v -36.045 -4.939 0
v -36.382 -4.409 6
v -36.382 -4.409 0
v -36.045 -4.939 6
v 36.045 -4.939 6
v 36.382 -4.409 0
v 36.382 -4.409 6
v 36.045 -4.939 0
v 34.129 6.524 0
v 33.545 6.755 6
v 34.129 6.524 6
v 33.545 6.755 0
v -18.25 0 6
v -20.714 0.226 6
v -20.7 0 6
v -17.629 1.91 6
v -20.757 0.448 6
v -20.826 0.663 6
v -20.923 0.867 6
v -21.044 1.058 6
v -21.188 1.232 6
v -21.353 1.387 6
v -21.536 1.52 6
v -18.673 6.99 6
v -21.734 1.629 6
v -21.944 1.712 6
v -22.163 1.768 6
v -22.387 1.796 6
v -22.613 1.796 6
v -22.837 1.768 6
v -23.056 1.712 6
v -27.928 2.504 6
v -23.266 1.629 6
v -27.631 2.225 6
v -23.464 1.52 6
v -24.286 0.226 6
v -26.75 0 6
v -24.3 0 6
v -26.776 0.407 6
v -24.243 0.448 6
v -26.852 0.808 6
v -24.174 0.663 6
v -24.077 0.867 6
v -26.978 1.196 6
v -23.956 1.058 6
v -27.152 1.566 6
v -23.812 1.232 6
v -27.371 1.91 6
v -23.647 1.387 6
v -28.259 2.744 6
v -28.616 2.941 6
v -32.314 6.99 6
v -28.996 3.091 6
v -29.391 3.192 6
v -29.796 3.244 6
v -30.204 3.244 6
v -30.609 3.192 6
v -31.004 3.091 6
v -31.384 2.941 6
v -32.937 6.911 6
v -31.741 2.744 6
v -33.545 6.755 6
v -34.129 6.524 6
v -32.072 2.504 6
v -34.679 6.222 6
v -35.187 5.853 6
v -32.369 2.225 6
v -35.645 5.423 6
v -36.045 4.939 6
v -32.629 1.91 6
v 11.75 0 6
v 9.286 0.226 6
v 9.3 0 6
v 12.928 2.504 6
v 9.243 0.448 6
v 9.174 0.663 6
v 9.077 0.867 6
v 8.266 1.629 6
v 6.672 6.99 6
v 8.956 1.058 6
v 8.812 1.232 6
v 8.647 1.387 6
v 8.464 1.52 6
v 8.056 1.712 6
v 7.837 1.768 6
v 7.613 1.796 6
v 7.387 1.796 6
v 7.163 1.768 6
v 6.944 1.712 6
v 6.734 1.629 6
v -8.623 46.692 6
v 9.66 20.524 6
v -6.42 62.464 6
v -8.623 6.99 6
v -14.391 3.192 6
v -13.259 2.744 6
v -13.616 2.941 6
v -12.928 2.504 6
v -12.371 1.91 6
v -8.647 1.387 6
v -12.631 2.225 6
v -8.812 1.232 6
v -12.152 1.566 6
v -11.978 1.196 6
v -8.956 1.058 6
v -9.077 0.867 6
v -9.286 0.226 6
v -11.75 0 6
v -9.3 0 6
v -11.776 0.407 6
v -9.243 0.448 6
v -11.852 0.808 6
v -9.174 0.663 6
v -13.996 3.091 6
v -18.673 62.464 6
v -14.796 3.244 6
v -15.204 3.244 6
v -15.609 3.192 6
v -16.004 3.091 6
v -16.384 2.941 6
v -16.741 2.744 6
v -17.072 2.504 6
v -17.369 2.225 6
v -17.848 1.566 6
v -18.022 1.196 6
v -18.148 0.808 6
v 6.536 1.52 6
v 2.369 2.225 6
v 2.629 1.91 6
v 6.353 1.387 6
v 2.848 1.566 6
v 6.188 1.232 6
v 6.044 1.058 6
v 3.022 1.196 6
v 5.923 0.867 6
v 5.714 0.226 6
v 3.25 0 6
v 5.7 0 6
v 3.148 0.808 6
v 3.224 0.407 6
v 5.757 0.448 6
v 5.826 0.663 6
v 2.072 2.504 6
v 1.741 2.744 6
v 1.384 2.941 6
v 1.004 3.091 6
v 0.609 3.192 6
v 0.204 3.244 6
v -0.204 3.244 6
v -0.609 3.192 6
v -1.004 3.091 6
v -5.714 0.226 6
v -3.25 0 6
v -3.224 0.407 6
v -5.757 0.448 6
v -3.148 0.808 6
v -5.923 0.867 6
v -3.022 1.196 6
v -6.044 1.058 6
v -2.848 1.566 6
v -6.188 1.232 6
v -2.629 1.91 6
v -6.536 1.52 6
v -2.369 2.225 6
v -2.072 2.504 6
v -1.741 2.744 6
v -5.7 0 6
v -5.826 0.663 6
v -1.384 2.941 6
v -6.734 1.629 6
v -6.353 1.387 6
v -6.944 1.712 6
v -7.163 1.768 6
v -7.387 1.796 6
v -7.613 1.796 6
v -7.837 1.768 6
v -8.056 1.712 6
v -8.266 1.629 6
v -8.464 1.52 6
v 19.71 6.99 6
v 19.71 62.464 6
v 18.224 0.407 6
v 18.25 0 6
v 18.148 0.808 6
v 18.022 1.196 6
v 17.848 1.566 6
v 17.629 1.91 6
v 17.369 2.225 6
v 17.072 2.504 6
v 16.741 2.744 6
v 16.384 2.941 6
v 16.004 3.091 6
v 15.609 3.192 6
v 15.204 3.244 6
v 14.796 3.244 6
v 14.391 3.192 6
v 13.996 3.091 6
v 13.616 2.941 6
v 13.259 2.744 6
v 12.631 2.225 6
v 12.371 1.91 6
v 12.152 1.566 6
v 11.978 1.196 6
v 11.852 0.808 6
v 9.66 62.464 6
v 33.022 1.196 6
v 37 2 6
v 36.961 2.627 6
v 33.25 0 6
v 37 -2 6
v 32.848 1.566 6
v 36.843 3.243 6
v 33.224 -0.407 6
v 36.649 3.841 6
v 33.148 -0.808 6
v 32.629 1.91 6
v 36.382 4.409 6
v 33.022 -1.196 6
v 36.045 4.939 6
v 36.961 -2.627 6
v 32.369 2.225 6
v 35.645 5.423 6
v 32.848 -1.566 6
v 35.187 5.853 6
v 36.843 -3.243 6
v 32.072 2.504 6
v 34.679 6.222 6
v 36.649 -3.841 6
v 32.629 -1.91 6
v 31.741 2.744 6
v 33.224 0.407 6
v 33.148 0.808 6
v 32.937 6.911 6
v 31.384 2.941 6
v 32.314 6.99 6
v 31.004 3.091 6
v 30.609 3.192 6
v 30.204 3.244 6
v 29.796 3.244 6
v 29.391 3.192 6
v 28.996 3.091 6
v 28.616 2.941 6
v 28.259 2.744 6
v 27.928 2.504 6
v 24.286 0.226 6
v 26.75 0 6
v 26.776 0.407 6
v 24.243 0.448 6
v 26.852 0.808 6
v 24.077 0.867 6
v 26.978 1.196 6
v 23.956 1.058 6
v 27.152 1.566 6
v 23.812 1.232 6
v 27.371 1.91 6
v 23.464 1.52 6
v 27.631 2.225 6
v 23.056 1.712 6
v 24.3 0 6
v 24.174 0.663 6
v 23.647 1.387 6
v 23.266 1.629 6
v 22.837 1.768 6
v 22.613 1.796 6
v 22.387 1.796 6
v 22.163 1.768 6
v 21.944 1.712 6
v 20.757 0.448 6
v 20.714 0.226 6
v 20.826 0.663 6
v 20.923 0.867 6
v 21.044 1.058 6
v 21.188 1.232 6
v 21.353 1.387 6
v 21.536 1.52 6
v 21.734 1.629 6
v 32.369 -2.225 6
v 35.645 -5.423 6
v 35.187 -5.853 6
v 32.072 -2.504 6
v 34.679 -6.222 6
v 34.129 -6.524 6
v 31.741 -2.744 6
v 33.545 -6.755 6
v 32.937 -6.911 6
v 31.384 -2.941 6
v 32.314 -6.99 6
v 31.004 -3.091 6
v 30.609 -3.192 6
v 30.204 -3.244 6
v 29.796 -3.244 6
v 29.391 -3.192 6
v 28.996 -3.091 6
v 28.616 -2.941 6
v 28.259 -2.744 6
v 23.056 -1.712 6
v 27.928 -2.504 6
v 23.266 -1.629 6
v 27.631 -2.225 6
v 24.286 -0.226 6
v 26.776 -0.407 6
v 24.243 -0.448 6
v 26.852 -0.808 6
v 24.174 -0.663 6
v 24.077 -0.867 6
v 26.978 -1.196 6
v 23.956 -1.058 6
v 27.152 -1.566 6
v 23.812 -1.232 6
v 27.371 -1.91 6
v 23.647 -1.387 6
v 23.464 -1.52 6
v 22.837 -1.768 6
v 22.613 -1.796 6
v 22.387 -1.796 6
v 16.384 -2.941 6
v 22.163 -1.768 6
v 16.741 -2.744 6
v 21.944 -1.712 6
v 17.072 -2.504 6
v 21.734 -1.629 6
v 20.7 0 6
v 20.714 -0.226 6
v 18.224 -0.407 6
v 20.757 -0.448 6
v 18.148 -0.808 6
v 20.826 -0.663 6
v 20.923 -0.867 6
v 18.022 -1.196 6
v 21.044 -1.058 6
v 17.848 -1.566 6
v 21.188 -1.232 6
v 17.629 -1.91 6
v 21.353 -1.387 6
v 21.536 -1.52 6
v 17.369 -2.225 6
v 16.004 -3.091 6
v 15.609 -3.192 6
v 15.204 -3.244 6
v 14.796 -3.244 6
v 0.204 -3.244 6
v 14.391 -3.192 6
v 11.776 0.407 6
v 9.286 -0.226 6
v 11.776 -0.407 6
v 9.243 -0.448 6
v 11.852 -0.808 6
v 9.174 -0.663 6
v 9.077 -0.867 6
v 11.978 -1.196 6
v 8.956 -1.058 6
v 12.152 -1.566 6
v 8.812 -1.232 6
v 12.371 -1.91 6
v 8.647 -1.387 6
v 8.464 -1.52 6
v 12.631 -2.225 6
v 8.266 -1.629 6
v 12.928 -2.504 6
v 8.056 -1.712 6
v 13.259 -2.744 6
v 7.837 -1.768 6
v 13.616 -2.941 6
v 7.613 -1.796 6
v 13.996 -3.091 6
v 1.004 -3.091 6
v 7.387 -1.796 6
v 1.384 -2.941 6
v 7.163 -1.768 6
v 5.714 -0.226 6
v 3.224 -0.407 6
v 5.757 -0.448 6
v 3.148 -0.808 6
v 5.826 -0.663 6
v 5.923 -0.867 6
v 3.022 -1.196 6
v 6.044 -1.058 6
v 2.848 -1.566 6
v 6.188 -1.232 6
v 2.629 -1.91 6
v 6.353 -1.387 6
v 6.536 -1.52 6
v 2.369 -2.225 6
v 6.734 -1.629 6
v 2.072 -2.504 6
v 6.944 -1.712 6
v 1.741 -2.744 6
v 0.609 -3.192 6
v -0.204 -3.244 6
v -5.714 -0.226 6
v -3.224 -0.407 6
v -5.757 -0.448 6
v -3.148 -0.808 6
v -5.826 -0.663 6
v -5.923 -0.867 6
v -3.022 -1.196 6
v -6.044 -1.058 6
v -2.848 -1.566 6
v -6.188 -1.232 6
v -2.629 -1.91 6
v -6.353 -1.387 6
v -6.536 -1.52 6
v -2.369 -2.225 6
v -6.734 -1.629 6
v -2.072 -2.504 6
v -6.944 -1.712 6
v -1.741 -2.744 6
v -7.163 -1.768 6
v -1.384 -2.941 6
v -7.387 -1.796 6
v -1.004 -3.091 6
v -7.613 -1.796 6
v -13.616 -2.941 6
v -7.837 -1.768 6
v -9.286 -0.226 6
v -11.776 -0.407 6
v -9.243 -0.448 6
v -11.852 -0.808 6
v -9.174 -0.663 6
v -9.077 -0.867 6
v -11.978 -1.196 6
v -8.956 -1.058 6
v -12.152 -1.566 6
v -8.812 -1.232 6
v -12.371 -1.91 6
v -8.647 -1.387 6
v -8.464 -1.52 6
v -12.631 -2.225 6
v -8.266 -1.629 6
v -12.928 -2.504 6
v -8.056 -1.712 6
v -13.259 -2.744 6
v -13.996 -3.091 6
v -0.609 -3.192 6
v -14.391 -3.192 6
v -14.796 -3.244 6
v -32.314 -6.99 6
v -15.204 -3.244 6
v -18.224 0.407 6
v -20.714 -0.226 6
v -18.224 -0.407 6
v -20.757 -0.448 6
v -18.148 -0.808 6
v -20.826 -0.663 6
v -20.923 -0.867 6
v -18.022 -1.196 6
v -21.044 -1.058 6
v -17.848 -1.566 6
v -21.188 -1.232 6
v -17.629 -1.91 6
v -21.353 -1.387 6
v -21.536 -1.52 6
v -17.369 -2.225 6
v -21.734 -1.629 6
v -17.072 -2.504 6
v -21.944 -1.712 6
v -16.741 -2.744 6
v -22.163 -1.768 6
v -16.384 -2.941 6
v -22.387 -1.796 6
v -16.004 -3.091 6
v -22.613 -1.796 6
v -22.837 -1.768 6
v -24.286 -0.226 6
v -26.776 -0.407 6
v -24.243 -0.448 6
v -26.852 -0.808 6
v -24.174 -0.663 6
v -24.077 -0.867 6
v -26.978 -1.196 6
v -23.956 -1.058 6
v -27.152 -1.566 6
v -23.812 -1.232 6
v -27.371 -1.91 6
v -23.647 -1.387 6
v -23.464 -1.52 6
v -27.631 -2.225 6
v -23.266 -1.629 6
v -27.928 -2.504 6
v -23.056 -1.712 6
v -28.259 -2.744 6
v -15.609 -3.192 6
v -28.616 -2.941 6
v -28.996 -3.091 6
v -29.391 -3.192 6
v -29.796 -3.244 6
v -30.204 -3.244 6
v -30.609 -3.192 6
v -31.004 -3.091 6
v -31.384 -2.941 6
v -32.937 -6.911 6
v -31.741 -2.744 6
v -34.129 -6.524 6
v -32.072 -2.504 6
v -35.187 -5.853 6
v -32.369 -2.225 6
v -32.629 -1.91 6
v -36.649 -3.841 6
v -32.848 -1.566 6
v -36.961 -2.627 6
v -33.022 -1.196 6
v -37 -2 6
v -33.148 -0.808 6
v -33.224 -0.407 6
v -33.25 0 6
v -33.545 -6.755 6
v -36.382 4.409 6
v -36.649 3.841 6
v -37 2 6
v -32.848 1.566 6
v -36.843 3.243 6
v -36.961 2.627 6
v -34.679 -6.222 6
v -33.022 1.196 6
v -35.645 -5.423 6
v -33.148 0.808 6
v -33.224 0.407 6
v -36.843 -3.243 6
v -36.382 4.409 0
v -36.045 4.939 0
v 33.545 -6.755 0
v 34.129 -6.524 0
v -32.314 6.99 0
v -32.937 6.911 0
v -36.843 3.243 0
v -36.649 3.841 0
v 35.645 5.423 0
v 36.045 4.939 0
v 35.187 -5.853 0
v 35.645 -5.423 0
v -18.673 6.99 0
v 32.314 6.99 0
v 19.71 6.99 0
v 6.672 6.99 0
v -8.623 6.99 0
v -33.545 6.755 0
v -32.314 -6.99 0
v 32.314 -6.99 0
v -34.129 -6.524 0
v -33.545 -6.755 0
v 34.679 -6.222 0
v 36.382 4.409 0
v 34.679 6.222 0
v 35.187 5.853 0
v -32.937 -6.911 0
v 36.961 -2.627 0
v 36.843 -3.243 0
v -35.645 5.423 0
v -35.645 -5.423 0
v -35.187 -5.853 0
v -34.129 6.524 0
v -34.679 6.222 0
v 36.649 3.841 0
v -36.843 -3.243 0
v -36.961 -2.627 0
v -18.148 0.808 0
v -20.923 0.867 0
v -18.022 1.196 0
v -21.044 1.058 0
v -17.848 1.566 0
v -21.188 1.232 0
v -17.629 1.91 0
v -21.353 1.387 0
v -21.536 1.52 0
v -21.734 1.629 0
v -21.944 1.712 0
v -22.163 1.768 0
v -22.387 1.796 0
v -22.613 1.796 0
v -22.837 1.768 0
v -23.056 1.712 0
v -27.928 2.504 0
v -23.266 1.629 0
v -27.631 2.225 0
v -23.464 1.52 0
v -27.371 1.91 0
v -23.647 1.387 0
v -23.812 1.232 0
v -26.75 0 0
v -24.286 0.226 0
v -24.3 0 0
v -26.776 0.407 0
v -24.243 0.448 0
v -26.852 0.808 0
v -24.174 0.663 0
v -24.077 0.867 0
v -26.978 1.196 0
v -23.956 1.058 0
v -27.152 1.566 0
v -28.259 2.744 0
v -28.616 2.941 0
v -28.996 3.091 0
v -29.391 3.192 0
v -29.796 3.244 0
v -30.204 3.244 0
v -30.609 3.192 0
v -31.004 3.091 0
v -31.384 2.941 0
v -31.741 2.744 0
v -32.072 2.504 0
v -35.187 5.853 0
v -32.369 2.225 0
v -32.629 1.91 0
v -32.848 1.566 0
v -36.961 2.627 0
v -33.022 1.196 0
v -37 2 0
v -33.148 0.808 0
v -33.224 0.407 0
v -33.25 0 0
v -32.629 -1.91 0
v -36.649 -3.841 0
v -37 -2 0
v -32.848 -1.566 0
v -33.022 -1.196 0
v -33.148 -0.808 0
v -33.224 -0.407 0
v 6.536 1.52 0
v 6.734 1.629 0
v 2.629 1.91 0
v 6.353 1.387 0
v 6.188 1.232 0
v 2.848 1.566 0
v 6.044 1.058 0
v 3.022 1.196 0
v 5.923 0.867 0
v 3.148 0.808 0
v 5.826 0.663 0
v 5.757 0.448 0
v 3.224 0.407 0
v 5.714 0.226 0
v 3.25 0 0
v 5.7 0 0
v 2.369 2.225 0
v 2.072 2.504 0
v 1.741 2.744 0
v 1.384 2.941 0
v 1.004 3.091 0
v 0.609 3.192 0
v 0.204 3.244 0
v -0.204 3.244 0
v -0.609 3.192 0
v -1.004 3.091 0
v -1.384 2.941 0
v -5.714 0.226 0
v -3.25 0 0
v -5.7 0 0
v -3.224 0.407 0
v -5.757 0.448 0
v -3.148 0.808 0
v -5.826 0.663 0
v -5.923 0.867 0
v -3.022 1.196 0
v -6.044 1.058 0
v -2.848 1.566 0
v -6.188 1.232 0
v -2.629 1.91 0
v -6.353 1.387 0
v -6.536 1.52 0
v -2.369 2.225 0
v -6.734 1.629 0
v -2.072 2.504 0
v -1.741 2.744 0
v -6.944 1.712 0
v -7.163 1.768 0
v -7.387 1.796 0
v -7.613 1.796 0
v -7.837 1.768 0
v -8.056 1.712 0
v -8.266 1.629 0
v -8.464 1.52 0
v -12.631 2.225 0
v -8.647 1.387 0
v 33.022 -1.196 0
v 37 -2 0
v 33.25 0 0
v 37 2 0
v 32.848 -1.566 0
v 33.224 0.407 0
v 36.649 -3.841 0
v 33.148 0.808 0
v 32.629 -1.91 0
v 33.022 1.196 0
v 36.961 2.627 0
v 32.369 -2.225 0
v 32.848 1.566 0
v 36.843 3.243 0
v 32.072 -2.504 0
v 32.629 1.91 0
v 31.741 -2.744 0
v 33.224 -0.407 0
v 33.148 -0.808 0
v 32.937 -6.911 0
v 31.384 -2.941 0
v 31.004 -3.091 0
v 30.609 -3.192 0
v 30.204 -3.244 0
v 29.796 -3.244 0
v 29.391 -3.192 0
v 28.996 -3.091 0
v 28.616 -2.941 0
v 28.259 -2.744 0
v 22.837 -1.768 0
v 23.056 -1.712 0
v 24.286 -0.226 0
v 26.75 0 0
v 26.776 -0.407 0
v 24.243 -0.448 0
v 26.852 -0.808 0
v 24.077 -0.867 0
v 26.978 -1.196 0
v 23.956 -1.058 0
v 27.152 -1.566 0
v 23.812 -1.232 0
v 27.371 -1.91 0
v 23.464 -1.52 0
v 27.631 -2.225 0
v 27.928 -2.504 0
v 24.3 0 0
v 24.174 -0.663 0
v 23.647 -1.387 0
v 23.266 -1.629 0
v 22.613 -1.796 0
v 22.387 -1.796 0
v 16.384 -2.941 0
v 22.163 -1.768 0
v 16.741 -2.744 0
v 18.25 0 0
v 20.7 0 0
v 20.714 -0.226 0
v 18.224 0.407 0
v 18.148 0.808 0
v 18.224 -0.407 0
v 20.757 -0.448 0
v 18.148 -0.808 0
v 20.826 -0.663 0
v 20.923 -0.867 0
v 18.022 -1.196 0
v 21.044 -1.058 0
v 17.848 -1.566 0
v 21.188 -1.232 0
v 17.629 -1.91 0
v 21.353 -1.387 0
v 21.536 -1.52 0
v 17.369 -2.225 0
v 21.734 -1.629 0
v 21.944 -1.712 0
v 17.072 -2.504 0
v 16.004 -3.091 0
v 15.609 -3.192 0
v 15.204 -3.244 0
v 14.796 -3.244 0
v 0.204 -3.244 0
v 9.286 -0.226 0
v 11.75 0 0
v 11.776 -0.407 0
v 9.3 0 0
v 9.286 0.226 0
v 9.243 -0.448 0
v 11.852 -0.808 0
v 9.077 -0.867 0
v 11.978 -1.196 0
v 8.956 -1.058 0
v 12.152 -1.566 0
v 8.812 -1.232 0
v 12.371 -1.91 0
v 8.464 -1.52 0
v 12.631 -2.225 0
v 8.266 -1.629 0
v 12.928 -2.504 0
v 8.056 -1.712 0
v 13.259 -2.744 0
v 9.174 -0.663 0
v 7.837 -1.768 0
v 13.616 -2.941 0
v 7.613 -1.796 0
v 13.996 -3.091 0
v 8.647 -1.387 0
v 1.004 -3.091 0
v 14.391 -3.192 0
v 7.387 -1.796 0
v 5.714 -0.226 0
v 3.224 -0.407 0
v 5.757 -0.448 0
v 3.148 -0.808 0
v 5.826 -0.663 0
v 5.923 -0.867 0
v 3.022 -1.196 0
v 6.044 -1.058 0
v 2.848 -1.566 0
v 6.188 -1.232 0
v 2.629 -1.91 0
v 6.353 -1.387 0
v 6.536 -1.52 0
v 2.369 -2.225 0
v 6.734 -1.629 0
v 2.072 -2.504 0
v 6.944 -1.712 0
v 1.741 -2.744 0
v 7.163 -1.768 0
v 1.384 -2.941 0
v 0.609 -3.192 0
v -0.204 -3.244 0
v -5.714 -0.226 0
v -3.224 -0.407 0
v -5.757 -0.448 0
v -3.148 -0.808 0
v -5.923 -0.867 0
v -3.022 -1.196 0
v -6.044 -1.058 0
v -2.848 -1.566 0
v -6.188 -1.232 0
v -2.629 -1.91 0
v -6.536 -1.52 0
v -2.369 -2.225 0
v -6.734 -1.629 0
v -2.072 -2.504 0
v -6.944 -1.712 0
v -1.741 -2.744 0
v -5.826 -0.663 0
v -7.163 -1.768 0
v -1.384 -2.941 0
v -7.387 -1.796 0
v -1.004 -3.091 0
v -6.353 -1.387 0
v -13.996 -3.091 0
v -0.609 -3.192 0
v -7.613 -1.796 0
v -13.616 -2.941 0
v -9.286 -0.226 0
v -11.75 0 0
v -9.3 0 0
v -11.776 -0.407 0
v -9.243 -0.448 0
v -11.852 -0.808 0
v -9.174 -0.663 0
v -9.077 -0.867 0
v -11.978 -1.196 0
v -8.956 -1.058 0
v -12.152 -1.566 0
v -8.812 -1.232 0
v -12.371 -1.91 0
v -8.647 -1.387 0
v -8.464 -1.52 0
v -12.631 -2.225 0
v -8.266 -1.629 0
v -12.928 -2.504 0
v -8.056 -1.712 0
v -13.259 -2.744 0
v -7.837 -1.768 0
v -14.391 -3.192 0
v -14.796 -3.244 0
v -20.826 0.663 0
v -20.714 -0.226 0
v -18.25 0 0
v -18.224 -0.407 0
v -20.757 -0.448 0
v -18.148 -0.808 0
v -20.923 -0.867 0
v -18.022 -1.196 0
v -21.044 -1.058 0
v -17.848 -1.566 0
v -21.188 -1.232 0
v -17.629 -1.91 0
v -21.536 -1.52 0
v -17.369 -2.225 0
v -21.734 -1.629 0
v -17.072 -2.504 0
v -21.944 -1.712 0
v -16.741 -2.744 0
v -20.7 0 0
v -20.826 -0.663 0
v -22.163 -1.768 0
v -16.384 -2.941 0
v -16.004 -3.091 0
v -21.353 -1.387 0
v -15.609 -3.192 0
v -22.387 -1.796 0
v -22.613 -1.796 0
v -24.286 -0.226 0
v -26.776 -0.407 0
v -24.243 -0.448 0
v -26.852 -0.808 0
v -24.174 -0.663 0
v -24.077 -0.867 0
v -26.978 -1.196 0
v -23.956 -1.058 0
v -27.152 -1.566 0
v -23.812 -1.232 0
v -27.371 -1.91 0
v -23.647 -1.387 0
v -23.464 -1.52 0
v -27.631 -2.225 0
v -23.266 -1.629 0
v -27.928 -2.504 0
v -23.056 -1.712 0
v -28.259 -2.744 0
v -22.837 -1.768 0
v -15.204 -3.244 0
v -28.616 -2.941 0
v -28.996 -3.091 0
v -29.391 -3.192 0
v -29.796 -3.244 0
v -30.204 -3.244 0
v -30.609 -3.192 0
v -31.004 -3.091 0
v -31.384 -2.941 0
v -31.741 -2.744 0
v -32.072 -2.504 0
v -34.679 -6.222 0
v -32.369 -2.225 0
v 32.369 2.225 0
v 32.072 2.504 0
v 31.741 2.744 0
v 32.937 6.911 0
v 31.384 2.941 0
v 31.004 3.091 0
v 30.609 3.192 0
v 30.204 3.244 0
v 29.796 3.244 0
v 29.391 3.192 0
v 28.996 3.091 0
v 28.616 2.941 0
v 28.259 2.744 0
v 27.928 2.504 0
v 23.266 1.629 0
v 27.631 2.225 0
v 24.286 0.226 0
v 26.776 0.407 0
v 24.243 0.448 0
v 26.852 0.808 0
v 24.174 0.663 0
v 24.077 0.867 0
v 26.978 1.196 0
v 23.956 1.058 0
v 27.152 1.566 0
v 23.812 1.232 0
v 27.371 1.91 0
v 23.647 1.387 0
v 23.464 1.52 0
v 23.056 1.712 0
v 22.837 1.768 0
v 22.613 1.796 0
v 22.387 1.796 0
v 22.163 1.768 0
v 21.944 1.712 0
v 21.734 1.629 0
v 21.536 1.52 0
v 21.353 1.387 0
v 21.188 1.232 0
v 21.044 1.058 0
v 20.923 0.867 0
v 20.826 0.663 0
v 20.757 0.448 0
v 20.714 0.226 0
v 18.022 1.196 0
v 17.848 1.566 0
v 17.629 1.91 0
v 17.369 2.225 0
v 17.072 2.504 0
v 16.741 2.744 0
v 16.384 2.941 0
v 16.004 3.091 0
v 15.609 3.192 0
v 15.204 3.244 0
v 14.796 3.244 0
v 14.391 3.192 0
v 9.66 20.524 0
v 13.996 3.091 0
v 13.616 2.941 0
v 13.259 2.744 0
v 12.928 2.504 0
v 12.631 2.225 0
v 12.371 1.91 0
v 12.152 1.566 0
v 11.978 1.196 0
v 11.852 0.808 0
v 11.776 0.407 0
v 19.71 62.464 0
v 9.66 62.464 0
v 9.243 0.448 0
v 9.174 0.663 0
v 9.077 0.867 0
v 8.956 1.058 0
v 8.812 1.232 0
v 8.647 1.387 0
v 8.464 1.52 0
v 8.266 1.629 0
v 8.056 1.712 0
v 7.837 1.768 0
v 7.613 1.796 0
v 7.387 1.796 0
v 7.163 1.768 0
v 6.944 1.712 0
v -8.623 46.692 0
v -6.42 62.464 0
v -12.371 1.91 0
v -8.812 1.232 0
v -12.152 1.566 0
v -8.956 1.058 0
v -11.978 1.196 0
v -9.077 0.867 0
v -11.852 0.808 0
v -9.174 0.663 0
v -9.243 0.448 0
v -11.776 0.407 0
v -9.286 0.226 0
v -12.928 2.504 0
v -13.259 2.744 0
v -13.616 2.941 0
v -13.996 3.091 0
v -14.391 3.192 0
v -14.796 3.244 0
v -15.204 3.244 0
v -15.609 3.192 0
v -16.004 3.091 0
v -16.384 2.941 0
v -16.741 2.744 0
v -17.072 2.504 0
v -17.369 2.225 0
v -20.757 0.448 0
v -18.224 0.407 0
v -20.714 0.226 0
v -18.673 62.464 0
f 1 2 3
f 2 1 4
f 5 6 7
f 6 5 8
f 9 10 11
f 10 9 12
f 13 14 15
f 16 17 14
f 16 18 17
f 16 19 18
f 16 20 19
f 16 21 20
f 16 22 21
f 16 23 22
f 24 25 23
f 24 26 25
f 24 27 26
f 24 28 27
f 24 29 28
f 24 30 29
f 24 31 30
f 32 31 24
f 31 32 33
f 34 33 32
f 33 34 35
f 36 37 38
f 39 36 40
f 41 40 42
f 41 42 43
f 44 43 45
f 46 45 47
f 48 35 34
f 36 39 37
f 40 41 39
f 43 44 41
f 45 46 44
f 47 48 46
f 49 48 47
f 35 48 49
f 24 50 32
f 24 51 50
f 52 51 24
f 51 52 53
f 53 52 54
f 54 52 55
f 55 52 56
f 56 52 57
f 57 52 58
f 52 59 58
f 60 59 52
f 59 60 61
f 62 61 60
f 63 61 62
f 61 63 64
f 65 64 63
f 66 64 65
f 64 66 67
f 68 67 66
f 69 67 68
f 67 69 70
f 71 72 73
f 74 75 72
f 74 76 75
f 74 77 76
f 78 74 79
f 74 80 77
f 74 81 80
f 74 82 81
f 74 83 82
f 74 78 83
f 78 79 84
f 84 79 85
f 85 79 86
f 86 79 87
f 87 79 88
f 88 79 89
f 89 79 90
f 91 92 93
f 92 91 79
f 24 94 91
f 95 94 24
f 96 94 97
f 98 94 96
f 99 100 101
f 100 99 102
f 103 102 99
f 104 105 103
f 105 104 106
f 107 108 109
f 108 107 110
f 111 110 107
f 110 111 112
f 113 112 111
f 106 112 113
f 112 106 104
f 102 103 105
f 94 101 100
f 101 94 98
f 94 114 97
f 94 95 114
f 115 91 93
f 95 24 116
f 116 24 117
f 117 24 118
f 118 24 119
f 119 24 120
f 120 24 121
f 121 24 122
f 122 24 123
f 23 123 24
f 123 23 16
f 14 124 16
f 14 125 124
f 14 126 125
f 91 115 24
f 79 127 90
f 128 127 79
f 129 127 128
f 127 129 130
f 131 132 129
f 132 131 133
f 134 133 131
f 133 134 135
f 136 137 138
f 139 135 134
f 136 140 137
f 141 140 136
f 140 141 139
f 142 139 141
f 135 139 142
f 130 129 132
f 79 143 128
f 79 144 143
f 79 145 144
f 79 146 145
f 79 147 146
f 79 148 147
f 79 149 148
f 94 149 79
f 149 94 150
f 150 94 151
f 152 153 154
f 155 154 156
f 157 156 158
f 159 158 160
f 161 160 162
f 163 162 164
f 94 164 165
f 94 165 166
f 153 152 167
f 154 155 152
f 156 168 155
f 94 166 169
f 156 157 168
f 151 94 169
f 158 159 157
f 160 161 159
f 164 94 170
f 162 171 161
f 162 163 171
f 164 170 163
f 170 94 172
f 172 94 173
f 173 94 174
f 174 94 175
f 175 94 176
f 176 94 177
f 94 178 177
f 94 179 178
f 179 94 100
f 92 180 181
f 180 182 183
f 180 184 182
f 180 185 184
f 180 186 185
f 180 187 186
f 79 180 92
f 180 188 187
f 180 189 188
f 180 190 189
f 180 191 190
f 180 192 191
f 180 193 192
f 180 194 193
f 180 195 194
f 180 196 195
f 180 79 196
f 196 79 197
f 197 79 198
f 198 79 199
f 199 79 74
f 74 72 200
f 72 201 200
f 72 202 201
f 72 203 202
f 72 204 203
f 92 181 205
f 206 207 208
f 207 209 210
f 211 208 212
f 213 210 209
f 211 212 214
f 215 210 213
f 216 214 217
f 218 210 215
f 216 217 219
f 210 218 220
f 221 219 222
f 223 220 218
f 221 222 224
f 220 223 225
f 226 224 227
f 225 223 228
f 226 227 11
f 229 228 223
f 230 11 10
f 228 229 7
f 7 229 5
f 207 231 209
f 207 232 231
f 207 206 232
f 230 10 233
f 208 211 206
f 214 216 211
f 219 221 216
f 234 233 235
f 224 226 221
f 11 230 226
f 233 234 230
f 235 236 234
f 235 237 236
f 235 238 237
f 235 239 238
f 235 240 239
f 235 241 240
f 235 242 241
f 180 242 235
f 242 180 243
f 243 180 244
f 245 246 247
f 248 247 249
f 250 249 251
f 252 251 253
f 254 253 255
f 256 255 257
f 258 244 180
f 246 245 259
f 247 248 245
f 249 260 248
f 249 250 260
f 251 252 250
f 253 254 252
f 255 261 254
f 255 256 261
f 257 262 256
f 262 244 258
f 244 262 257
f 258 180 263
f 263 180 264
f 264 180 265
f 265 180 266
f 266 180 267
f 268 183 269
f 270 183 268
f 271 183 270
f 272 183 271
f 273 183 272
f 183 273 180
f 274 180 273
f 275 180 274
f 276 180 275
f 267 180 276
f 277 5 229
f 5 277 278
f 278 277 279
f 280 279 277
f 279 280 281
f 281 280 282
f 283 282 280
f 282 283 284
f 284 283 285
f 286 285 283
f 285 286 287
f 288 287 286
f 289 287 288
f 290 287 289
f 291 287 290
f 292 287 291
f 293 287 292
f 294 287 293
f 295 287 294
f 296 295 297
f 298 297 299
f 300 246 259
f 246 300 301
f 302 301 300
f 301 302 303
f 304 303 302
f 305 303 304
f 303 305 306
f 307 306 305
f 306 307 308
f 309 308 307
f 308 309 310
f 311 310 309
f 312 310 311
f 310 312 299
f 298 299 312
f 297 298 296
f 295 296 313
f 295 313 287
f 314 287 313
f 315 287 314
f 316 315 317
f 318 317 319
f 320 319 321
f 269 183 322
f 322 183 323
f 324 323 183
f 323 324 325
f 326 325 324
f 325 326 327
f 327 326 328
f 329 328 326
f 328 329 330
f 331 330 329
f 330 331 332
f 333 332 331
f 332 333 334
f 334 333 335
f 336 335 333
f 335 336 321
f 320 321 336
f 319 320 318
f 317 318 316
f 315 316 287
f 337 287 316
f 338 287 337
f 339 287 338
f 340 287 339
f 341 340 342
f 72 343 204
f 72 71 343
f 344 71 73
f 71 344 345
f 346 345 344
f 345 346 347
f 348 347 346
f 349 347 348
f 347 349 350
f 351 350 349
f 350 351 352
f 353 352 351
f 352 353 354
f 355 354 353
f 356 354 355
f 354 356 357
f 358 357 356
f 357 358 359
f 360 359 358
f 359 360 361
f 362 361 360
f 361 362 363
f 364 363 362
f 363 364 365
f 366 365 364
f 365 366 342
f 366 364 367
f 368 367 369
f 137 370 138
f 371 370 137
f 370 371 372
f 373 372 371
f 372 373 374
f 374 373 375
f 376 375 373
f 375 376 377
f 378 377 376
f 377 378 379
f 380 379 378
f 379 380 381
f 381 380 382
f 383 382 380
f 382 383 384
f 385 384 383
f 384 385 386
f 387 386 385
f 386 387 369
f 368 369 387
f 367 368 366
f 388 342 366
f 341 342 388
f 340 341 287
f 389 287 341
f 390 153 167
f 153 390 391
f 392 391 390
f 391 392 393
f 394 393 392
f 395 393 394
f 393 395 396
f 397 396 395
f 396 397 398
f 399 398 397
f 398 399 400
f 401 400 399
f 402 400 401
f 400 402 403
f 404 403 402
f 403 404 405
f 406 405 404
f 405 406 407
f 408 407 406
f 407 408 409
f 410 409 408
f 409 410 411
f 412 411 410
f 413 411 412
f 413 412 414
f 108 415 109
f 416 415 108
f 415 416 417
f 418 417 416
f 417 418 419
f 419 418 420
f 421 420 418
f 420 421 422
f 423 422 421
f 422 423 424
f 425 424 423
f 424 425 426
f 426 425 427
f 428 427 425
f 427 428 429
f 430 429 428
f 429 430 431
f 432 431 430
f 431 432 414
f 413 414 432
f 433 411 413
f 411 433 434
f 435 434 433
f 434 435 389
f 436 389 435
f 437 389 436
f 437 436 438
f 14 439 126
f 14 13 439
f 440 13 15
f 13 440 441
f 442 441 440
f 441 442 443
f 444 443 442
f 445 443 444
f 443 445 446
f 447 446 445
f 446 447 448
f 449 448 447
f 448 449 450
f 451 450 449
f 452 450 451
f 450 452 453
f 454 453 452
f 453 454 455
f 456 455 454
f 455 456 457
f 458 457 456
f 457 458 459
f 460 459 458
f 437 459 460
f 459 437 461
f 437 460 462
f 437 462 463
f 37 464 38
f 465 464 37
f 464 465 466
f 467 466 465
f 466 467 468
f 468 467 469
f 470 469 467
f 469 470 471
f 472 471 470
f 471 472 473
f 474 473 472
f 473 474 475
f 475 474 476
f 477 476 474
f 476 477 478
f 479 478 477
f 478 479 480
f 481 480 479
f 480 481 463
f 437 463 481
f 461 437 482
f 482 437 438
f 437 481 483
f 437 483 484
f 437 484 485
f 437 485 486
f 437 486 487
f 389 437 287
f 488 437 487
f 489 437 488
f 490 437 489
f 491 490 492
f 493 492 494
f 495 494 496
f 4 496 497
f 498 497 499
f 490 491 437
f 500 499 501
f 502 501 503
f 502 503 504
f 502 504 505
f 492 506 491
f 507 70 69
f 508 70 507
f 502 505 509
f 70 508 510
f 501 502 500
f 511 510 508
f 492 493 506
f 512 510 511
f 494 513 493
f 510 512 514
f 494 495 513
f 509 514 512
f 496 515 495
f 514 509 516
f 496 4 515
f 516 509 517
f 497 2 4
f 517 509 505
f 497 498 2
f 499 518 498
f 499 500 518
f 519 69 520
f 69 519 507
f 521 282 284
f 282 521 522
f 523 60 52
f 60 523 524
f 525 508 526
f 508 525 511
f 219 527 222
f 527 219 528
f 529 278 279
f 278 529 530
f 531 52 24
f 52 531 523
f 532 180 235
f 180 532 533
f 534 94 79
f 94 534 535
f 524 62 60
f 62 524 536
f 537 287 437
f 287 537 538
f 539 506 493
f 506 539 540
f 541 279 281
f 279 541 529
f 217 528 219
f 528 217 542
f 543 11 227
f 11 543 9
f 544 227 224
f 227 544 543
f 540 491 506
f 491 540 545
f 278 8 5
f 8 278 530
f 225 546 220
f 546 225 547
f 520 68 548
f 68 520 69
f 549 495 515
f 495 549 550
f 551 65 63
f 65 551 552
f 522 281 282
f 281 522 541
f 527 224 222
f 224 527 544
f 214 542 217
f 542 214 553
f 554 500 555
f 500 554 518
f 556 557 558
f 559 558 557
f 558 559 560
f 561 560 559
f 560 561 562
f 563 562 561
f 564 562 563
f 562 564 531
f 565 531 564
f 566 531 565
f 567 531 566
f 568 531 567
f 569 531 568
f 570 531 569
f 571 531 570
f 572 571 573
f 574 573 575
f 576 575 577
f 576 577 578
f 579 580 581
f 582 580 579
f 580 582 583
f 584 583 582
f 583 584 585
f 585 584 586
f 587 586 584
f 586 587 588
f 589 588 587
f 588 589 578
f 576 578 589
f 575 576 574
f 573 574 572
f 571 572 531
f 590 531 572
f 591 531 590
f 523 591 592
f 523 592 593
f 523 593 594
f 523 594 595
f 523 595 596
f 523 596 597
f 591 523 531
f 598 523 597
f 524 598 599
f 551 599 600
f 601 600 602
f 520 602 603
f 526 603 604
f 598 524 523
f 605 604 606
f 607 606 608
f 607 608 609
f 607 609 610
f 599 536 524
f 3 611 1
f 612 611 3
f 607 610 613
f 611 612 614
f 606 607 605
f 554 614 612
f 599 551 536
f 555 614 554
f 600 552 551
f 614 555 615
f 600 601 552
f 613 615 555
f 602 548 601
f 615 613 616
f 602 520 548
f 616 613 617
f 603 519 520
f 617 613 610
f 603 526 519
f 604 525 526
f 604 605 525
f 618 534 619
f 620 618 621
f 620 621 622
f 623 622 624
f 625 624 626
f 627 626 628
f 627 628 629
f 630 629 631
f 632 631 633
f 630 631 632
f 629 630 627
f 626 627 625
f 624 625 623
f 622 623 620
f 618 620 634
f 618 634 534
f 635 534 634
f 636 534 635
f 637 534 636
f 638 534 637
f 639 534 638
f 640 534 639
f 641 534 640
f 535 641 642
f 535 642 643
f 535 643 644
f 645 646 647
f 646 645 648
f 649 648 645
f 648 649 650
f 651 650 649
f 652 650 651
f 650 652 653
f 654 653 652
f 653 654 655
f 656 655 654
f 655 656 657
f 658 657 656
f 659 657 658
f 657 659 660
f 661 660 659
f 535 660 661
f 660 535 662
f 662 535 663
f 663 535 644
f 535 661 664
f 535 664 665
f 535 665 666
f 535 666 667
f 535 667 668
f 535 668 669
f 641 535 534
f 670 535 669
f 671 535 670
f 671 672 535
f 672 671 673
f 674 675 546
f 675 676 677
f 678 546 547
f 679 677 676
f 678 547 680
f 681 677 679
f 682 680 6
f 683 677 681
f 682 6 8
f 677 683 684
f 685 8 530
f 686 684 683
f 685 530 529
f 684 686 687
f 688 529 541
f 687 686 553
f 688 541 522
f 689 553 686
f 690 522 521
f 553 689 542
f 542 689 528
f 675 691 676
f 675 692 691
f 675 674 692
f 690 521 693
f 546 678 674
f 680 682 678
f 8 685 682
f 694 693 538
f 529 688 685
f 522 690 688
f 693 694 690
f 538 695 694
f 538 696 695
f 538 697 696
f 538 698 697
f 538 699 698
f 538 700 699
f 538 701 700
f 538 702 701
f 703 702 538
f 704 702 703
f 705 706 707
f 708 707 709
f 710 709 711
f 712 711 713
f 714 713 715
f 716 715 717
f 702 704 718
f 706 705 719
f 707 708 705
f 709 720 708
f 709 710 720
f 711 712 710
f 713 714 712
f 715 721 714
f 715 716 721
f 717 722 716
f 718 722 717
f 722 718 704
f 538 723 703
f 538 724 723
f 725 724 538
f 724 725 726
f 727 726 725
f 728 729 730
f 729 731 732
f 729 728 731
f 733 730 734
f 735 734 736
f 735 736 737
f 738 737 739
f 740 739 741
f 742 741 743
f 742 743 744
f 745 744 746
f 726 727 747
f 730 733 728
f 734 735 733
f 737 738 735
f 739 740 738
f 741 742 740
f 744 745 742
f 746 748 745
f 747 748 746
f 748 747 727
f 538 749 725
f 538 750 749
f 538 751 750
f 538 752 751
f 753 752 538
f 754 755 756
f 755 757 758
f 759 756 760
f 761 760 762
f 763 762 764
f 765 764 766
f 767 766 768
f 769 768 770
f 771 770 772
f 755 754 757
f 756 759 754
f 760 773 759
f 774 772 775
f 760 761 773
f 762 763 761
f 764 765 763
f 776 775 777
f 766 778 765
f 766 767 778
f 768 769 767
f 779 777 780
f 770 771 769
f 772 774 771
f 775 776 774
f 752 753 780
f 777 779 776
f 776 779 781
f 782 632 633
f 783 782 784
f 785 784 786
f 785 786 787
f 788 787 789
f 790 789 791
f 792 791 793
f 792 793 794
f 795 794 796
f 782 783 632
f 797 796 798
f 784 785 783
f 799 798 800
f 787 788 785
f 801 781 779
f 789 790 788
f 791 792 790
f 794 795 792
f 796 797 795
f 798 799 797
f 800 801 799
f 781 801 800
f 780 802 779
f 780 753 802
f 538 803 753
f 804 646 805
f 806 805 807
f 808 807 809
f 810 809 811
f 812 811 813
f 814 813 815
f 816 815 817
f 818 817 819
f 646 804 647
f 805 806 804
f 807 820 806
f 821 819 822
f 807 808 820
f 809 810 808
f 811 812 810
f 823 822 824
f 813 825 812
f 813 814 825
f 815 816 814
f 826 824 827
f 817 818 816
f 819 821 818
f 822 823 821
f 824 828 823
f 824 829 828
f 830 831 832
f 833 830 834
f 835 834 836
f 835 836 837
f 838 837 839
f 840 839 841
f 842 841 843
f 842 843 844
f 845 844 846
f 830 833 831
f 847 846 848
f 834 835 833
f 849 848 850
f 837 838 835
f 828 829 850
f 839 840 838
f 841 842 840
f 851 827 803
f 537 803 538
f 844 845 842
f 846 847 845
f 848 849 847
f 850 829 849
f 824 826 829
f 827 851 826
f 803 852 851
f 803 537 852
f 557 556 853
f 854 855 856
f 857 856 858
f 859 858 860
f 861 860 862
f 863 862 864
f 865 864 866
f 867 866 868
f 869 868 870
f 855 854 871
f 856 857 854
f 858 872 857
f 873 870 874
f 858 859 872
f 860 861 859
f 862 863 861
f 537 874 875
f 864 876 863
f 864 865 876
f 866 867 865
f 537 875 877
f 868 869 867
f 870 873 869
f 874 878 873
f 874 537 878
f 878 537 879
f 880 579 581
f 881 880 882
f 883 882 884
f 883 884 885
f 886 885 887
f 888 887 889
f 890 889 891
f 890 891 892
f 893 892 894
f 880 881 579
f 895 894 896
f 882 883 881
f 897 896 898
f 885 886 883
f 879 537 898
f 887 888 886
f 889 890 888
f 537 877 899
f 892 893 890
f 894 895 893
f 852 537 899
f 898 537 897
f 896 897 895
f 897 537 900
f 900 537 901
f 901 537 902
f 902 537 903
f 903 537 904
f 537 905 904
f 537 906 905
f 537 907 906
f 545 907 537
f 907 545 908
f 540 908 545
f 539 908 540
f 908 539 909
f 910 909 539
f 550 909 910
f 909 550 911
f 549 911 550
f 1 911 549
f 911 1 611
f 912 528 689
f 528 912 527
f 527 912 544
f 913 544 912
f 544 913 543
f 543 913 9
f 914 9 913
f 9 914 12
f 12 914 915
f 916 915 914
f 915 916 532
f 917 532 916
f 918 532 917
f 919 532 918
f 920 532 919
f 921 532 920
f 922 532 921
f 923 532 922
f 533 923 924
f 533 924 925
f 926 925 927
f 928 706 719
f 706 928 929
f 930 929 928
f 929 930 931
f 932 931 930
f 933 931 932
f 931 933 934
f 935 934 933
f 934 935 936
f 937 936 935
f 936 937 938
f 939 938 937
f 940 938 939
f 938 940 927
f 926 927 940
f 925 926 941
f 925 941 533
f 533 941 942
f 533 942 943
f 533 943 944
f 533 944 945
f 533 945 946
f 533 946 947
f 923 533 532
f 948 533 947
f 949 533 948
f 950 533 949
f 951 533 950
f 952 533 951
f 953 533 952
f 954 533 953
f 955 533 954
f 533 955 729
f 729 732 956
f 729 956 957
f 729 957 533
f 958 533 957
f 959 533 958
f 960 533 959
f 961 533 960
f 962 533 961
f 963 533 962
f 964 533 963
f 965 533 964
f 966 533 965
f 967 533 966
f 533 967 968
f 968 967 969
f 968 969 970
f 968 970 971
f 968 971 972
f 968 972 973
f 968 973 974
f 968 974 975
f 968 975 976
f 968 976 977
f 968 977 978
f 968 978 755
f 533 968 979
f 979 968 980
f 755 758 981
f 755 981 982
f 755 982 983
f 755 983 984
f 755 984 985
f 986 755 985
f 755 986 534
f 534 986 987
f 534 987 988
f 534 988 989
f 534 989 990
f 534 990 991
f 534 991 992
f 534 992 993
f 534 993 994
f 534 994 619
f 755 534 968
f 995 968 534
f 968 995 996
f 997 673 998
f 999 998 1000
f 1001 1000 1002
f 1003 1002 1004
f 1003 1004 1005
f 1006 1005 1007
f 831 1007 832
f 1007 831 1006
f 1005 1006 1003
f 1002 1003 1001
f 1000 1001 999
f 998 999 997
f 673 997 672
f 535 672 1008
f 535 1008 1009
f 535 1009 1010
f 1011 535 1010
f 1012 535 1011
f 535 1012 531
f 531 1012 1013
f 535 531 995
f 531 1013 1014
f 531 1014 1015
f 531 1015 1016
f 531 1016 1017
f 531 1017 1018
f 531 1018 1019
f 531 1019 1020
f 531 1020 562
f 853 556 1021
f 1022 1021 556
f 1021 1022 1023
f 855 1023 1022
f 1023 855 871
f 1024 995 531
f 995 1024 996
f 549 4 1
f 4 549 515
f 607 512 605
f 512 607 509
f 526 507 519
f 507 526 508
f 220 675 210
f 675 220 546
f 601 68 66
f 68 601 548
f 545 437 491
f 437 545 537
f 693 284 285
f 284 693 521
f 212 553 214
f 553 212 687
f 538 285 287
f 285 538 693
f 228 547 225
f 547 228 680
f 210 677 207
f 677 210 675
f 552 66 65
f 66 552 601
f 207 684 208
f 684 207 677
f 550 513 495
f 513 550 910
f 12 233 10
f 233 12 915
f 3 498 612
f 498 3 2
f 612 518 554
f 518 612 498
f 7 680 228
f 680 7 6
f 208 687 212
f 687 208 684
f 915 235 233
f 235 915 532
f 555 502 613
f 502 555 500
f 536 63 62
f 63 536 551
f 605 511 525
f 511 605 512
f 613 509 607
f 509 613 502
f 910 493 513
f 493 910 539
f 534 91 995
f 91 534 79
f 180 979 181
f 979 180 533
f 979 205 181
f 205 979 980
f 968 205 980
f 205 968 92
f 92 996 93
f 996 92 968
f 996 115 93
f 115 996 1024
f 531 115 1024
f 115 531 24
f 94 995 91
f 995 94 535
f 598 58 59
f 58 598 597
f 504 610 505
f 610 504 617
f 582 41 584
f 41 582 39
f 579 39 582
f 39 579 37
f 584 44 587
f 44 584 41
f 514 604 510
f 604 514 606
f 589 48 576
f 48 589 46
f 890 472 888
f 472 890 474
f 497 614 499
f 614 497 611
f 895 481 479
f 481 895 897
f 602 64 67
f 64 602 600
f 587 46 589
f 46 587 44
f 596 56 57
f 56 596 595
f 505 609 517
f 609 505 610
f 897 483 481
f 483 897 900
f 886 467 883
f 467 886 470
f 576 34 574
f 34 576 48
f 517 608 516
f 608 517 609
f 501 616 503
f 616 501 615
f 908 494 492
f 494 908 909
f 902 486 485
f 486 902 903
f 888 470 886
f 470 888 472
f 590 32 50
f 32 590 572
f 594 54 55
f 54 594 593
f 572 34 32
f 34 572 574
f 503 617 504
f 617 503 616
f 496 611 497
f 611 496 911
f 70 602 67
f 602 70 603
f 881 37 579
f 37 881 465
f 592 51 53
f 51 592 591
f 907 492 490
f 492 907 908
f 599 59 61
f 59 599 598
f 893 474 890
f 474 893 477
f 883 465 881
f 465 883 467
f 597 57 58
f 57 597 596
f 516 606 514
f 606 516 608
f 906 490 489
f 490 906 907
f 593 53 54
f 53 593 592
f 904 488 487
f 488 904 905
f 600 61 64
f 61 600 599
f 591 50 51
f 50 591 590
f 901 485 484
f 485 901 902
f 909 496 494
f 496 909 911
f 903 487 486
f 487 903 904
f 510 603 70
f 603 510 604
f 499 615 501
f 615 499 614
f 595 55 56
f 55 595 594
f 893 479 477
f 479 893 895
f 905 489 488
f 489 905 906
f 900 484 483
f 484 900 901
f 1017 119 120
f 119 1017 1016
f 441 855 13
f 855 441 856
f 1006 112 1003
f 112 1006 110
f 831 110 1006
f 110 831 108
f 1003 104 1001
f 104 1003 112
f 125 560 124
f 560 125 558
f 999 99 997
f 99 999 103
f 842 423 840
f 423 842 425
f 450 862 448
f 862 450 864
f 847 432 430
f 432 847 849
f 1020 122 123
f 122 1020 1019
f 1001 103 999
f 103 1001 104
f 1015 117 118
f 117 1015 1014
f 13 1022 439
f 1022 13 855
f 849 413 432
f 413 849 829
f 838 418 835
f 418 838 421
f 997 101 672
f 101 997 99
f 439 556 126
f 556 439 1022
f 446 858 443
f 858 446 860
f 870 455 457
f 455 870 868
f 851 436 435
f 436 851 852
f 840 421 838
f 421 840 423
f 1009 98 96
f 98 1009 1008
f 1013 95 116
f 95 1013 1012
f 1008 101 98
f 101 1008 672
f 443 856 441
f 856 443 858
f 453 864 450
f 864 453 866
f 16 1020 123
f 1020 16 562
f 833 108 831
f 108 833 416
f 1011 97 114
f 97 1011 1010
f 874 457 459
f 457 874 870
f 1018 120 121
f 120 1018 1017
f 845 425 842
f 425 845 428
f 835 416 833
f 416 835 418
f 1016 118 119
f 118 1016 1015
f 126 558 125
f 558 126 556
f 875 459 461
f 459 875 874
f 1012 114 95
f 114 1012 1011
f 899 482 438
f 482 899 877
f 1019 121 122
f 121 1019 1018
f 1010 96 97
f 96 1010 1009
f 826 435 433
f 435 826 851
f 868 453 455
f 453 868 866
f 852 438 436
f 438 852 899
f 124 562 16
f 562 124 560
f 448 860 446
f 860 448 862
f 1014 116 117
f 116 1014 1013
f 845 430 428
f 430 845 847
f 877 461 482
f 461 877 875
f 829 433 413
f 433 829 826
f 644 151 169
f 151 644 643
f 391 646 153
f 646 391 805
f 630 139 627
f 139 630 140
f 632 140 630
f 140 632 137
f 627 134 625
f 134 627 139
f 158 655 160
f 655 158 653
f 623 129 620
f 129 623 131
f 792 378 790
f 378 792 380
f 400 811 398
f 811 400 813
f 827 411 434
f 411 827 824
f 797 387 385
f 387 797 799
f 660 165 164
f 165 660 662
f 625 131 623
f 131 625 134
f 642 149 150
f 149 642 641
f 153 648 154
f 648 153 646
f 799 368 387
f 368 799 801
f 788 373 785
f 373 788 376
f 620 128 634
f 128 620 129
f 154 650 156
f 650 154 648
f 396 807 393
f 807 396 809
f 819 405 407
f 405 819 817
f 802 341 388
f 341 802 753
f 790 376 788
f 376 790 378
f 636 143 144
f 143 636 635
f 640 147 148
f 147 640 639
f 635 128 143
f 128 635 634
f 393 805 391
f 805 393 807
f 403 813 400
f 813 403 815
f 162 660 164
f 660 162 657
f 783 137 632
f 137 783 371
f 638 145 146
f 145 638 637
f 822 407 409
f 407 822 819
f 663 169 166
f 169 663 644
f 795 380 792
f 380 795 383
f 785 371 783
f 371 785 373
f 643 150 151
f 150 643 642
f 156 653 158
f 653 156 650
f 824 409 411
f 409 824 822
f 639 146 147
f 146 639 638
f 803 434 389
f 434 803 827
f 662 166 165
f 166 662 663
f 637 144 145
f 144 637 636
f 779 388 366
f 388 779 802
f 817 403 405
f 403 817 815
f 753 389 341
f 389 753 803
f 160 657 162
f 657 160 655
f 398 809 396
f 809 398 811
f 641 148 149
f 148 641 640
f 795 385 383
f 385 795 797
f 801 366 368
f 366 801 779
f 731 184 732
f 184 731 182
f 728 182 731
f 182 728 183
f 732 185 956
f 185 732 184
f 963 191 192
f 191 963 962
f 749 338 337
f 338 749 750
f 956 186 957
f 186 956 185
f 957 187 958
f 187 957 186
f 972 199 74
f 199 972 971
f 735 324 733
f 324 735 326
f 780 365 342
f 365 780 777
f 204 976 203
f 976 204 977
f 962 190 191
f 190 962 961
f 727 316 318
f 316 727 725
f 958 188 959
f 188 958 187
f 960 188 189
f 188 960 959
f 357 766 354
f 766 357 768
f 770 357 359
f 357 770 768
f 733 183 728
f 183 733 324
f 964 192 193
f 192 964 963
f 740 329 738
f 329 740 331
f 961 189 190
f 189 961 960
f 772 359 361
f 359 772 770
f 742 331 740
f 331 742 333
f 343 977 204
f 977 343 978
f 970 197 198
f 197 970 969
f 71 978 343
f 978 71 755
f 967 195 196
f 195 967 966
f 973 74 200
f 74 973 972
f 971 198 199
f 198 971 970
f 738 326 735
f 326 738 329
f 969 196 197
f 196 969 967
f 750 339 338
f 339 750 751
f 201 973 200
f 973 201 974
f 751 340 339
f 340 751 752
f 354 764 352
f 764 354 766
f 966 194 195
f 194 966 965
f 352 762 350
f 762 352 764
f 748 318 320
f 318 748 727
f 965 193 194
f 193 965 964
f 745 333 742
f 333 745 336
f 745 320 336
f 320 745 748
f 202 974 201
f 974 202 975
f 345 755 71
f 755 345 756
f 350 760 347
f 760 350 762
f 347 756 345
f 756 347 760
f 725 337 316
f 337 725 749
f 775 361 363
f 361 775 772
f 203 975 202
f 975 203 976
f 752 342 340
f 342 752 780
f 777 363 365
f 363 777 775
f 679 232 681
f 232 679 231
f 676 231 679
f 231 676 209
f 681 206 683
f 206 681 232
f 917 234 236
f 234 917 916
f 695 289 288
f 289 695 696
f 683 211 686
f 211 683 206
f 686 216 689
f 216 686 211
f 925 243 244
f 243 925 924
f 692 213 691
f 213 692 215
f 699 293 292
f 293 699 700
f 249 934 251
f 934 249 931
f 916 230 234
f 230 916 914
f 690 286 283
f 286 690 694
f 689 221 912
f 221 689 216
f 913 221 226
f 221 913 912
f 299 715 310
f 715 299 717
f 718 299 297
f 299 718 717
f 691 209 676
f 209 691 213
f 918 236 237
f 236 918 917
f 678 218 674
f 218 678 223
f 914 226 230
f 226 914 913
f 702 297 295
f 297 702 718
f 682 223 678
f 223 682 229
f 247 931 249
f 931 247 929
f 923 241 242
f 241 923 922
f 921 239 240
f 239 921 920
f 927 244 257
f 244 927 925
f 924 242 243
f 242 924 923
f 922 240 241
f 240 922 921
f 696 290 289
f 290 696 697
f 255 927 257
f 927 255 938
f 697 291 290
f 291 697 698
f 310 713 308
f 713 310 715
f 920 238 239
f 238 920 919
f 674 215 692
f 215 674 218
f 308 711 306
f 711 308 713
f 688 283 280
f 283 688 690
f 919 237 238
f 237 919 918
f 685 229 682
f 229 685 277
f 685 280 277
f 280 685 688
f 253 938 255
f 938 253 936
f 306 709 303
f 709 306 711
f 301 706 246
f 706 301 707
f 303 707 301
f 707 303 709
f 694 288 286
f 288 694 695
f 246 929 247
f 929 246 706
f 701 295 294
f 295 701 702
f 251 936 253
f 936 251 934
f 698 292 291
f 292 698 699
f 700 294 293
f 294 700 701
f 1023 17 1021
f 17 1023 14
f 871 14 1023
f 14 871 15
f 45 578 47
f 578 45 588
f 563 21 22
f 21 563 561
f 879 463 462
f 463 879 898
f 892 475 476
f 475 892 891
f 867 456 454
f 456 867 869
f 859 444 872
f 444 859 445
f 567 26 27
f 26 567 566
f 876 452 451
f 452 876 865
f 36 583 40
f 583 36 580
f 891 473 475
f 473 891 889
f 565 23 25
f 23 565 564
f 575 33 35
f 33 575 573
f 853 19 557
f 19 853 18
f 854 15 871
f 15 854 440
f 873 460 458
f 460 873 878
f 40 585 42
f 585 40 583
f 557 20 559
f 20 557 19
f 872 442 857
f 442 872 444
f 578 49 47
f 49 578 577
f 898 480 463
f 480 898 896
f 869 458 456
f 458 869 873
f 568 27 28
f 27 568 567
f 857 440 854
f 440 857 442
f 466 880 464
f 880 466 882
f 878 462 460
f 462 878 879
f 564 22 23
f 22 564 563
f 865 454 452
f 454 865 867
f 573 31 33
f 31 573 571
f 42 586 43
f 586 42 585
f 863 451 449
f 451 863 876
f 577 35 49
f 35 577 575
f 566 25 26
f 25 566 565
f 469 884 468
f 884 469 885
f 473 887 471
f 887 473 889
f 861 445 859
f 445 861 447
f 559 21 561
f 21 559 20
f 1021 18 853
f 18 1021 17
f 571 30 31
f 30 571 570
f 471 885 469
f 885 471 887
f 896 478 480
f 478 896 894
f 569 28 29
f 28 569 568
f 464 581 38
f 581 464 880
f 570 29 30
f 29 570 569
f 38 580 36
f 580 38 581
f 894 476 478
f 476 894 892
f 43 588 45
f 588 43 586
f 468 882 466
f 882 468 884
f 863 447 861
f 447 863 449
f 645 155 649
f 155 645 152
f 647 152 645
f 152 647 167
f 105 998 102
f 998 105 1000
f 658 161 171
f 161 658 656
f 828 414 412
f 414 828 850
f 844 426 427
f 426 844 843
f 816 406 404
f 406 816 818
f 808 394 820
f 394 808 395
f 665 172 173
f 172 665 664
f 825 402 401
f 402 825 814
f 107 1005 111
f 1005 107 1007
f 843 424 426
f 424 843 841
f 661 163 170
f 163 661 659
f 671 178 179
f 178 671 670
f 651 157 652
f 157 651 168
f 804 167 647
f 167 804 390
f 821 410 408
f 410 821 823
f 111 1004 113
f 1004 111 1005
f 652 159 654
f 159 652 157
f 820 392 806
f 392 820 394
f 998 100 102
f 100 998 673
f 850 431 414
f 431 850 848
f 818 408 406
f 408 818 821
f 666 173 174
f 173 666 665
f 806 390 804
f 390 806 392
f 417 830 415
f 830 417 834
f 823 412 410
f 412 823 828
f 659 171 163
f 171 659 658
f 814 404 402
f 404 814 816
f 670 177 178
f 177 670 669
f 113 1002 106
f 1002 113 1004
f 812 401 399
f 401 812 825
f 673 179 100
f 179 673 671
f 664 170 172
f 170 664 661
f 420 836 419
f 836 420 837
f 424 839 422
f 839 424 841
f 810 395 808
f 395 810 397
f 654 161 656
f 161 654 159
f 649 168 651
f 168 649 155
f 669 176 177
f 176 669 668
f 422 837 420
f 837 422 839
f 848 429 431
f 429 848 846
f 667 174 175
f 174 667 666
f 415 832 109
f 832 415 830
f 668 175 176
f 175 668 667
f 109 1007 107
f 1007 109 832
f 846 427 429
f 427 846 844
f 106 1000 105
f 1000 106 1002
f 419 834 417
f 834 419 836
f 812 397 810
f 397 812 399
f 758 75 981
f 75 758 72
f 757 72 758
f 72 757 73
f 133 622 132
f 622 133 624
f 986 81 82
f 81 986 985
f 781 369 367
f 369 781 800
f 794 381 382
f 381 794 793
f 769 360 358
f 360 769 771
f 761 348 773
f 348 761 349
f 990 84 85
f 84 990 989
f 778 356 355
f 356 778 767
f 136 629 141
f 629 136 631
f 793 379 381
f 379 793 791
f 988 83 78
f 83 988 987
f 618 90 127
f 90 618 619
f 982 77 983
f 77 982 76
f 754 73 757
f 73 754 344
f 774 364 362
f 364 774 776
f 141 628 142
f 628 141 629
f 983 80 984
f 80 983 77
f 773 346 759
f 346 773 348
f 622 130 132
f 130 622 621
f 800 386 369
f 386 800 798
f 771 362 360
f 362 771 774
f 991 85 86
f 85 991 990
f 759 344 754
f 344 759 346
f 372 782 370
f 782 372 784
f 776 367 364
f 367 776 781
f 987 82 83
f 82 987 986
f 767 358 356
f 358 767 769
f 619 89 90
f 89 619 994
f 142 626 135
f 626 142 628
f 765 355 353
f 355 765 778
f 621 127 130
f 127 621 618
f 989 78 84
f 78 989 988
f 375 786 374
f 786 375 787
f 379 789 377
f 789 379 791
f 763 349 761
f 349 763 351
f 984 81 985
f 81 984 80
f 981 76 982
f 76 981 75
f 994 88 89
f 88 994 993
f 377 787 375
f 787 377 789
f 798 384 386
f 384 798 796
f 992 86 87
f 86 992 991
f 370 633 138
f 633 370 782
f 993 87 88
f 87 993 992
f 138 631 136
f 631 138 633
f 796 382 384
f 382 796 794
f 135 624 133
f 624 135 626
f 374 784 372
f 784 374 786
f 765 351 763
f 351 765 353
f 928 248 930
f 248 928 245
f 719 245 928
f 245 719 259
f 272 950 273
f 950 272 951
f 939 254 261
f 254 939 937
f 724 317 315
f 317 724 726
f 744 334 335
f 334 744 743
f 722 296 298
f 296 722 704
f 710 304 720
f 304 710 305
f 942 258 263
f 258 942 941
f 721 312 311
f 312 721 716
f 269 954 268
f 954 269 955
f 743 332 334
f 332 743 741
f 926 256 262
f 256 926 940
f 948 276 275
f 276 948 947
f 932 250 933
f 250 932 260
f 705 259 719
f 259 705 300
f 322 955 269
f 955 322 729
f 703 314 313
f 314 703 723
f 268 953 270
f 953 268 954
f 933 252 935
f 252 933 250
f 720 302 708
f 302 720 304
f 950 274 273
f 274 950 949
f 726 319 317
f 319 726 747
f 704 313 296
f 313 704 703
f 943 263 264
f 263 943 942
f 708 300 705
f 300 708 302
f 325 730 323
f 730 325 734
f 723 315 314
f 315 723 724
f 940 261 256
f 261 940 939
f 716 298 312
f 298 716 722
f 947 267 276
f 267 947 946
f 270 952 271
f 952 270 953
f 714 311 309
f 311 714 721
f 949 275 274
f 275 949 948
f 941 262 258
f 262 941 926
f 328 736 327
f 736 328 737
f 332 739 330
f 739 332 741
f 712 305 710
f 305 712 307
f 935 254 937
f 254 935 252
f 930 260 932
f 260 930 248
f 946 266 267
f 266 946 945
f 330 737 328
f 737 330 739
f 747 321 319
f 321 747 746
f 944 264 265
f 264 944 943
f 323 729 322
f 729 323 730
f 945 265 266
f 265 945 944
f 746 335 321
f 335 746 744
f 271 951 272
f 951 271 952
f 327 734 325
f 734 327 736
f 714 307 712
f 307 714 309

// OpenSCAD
$fn = 50;


difference() {
	union() {
		hull() {
			translate(v = [-32.0000000000, 2.0000000000, 0]) {
				cylinder(h = 6, r = 5);
			}
			translate(v = [32.0000000000, 2.0000000000, 0]) {
				cylinder(h = 6, r = 5);
			}
			translate(v = [-32.0000000000, -2.0000000000, 0]) {
				cylinder(h = 6, r = 5);
			}
			translate(v = [32.0000000000, -2.0000000000, 0]) {
				cylinder(h = 6, r = 5);
			}
		}
		translate(v = [0, 61.1111111111, 0]) {
			linear_extrude(height = 6) {
				text(font = "DejaVu Sans Mono:style=Bold", halign = "center", size = 57.0000000000, text = "N", valign = "top");
			}
		}
	}
	union() {
		translate(v = [-30.0000000000, 0.0000000000, 0]) {
			translate(v = [0, 0, -100]) {
				cylinder(h = 200, r = 3.2500000000);
			}
		}
		translate(v = [-15.0000000000, 0.0000000000, 0]) {
			translate(v = [0, 0, -100]) {
				cylinder(h = 200, r = 3.2500000000);
			}
		}
		translate(v = [0, 0, -100]) {
			cylinder(h = 200, r = 3.2500000000);
		}
		translate(v = [15.0000000000, 0.0000000000, 0]) {
			translate(v = [0, 0, -100]) {
				cylinder(h = 200, r = 3.2500000000);
			}
		}
		translate(v = [30.0000000000, 0.0000000000, 0]) {
			translate(v = [0, 0, -100]) {
				cylinder(h = 200, r = 3.2500000000);
			}
		}
		translate(v = [-30.0000000000, 0.0000000000, 0]) {
			translate(v = [0, 0, -100]) {
				cylinder(h = 200, r = 1.8000000000);
			}
		}
		translate(v = [-22.5000000000, 0.0000000000, 0]) {
			translate(v = [0, 0, -100]) {
				cylinder(h = 200, r = 1.8000000000);
			}
		}
		translate(v = [-15.0000000000, 0.0000000000, 0]) {
			translate(v = [0, 0, -100]) {
				cylinder(h = 200, r = 1.8000000000);
			}
		}
		translate(v = [-7.5000000000, 0.0000000000, 0]) {
			translate(v = [0, 0, -100]) {
				cylinder(h = 200, r = 1.8000000000);
			}
		}
		translate(v = [0, 0, -100]) {
			cylinder(h = 200, r = 1.8000000000);
		}
		translate(v = [7.5000000000, 0.0000000000, 0]) {
			translate(v = [0, 0, -100]) {
				cylinder(h = 200, r = 1.8000000000);
			}
		}
		translate(v = [15.0000000000, 0.0000000000, 0]) {
			translate(v = [0, 0, -100]) {
				cylinder(h = 200, r = 1.8000000000);
			}
		}
		translate(v = [22.5000000000, 0.0000000000, 0]) {
			translate(v = [0, 0, -100]) {
				cylinder(h = 200, r = 1.8000000000);
			}
		}
		translate(v = [30.0000000000, 0.0000000000, 0]) {
			translate(v = [0, 0, -100]) {
				cylinder(h = 200, r = 1.8000000000);
			}
		}
	}
}
